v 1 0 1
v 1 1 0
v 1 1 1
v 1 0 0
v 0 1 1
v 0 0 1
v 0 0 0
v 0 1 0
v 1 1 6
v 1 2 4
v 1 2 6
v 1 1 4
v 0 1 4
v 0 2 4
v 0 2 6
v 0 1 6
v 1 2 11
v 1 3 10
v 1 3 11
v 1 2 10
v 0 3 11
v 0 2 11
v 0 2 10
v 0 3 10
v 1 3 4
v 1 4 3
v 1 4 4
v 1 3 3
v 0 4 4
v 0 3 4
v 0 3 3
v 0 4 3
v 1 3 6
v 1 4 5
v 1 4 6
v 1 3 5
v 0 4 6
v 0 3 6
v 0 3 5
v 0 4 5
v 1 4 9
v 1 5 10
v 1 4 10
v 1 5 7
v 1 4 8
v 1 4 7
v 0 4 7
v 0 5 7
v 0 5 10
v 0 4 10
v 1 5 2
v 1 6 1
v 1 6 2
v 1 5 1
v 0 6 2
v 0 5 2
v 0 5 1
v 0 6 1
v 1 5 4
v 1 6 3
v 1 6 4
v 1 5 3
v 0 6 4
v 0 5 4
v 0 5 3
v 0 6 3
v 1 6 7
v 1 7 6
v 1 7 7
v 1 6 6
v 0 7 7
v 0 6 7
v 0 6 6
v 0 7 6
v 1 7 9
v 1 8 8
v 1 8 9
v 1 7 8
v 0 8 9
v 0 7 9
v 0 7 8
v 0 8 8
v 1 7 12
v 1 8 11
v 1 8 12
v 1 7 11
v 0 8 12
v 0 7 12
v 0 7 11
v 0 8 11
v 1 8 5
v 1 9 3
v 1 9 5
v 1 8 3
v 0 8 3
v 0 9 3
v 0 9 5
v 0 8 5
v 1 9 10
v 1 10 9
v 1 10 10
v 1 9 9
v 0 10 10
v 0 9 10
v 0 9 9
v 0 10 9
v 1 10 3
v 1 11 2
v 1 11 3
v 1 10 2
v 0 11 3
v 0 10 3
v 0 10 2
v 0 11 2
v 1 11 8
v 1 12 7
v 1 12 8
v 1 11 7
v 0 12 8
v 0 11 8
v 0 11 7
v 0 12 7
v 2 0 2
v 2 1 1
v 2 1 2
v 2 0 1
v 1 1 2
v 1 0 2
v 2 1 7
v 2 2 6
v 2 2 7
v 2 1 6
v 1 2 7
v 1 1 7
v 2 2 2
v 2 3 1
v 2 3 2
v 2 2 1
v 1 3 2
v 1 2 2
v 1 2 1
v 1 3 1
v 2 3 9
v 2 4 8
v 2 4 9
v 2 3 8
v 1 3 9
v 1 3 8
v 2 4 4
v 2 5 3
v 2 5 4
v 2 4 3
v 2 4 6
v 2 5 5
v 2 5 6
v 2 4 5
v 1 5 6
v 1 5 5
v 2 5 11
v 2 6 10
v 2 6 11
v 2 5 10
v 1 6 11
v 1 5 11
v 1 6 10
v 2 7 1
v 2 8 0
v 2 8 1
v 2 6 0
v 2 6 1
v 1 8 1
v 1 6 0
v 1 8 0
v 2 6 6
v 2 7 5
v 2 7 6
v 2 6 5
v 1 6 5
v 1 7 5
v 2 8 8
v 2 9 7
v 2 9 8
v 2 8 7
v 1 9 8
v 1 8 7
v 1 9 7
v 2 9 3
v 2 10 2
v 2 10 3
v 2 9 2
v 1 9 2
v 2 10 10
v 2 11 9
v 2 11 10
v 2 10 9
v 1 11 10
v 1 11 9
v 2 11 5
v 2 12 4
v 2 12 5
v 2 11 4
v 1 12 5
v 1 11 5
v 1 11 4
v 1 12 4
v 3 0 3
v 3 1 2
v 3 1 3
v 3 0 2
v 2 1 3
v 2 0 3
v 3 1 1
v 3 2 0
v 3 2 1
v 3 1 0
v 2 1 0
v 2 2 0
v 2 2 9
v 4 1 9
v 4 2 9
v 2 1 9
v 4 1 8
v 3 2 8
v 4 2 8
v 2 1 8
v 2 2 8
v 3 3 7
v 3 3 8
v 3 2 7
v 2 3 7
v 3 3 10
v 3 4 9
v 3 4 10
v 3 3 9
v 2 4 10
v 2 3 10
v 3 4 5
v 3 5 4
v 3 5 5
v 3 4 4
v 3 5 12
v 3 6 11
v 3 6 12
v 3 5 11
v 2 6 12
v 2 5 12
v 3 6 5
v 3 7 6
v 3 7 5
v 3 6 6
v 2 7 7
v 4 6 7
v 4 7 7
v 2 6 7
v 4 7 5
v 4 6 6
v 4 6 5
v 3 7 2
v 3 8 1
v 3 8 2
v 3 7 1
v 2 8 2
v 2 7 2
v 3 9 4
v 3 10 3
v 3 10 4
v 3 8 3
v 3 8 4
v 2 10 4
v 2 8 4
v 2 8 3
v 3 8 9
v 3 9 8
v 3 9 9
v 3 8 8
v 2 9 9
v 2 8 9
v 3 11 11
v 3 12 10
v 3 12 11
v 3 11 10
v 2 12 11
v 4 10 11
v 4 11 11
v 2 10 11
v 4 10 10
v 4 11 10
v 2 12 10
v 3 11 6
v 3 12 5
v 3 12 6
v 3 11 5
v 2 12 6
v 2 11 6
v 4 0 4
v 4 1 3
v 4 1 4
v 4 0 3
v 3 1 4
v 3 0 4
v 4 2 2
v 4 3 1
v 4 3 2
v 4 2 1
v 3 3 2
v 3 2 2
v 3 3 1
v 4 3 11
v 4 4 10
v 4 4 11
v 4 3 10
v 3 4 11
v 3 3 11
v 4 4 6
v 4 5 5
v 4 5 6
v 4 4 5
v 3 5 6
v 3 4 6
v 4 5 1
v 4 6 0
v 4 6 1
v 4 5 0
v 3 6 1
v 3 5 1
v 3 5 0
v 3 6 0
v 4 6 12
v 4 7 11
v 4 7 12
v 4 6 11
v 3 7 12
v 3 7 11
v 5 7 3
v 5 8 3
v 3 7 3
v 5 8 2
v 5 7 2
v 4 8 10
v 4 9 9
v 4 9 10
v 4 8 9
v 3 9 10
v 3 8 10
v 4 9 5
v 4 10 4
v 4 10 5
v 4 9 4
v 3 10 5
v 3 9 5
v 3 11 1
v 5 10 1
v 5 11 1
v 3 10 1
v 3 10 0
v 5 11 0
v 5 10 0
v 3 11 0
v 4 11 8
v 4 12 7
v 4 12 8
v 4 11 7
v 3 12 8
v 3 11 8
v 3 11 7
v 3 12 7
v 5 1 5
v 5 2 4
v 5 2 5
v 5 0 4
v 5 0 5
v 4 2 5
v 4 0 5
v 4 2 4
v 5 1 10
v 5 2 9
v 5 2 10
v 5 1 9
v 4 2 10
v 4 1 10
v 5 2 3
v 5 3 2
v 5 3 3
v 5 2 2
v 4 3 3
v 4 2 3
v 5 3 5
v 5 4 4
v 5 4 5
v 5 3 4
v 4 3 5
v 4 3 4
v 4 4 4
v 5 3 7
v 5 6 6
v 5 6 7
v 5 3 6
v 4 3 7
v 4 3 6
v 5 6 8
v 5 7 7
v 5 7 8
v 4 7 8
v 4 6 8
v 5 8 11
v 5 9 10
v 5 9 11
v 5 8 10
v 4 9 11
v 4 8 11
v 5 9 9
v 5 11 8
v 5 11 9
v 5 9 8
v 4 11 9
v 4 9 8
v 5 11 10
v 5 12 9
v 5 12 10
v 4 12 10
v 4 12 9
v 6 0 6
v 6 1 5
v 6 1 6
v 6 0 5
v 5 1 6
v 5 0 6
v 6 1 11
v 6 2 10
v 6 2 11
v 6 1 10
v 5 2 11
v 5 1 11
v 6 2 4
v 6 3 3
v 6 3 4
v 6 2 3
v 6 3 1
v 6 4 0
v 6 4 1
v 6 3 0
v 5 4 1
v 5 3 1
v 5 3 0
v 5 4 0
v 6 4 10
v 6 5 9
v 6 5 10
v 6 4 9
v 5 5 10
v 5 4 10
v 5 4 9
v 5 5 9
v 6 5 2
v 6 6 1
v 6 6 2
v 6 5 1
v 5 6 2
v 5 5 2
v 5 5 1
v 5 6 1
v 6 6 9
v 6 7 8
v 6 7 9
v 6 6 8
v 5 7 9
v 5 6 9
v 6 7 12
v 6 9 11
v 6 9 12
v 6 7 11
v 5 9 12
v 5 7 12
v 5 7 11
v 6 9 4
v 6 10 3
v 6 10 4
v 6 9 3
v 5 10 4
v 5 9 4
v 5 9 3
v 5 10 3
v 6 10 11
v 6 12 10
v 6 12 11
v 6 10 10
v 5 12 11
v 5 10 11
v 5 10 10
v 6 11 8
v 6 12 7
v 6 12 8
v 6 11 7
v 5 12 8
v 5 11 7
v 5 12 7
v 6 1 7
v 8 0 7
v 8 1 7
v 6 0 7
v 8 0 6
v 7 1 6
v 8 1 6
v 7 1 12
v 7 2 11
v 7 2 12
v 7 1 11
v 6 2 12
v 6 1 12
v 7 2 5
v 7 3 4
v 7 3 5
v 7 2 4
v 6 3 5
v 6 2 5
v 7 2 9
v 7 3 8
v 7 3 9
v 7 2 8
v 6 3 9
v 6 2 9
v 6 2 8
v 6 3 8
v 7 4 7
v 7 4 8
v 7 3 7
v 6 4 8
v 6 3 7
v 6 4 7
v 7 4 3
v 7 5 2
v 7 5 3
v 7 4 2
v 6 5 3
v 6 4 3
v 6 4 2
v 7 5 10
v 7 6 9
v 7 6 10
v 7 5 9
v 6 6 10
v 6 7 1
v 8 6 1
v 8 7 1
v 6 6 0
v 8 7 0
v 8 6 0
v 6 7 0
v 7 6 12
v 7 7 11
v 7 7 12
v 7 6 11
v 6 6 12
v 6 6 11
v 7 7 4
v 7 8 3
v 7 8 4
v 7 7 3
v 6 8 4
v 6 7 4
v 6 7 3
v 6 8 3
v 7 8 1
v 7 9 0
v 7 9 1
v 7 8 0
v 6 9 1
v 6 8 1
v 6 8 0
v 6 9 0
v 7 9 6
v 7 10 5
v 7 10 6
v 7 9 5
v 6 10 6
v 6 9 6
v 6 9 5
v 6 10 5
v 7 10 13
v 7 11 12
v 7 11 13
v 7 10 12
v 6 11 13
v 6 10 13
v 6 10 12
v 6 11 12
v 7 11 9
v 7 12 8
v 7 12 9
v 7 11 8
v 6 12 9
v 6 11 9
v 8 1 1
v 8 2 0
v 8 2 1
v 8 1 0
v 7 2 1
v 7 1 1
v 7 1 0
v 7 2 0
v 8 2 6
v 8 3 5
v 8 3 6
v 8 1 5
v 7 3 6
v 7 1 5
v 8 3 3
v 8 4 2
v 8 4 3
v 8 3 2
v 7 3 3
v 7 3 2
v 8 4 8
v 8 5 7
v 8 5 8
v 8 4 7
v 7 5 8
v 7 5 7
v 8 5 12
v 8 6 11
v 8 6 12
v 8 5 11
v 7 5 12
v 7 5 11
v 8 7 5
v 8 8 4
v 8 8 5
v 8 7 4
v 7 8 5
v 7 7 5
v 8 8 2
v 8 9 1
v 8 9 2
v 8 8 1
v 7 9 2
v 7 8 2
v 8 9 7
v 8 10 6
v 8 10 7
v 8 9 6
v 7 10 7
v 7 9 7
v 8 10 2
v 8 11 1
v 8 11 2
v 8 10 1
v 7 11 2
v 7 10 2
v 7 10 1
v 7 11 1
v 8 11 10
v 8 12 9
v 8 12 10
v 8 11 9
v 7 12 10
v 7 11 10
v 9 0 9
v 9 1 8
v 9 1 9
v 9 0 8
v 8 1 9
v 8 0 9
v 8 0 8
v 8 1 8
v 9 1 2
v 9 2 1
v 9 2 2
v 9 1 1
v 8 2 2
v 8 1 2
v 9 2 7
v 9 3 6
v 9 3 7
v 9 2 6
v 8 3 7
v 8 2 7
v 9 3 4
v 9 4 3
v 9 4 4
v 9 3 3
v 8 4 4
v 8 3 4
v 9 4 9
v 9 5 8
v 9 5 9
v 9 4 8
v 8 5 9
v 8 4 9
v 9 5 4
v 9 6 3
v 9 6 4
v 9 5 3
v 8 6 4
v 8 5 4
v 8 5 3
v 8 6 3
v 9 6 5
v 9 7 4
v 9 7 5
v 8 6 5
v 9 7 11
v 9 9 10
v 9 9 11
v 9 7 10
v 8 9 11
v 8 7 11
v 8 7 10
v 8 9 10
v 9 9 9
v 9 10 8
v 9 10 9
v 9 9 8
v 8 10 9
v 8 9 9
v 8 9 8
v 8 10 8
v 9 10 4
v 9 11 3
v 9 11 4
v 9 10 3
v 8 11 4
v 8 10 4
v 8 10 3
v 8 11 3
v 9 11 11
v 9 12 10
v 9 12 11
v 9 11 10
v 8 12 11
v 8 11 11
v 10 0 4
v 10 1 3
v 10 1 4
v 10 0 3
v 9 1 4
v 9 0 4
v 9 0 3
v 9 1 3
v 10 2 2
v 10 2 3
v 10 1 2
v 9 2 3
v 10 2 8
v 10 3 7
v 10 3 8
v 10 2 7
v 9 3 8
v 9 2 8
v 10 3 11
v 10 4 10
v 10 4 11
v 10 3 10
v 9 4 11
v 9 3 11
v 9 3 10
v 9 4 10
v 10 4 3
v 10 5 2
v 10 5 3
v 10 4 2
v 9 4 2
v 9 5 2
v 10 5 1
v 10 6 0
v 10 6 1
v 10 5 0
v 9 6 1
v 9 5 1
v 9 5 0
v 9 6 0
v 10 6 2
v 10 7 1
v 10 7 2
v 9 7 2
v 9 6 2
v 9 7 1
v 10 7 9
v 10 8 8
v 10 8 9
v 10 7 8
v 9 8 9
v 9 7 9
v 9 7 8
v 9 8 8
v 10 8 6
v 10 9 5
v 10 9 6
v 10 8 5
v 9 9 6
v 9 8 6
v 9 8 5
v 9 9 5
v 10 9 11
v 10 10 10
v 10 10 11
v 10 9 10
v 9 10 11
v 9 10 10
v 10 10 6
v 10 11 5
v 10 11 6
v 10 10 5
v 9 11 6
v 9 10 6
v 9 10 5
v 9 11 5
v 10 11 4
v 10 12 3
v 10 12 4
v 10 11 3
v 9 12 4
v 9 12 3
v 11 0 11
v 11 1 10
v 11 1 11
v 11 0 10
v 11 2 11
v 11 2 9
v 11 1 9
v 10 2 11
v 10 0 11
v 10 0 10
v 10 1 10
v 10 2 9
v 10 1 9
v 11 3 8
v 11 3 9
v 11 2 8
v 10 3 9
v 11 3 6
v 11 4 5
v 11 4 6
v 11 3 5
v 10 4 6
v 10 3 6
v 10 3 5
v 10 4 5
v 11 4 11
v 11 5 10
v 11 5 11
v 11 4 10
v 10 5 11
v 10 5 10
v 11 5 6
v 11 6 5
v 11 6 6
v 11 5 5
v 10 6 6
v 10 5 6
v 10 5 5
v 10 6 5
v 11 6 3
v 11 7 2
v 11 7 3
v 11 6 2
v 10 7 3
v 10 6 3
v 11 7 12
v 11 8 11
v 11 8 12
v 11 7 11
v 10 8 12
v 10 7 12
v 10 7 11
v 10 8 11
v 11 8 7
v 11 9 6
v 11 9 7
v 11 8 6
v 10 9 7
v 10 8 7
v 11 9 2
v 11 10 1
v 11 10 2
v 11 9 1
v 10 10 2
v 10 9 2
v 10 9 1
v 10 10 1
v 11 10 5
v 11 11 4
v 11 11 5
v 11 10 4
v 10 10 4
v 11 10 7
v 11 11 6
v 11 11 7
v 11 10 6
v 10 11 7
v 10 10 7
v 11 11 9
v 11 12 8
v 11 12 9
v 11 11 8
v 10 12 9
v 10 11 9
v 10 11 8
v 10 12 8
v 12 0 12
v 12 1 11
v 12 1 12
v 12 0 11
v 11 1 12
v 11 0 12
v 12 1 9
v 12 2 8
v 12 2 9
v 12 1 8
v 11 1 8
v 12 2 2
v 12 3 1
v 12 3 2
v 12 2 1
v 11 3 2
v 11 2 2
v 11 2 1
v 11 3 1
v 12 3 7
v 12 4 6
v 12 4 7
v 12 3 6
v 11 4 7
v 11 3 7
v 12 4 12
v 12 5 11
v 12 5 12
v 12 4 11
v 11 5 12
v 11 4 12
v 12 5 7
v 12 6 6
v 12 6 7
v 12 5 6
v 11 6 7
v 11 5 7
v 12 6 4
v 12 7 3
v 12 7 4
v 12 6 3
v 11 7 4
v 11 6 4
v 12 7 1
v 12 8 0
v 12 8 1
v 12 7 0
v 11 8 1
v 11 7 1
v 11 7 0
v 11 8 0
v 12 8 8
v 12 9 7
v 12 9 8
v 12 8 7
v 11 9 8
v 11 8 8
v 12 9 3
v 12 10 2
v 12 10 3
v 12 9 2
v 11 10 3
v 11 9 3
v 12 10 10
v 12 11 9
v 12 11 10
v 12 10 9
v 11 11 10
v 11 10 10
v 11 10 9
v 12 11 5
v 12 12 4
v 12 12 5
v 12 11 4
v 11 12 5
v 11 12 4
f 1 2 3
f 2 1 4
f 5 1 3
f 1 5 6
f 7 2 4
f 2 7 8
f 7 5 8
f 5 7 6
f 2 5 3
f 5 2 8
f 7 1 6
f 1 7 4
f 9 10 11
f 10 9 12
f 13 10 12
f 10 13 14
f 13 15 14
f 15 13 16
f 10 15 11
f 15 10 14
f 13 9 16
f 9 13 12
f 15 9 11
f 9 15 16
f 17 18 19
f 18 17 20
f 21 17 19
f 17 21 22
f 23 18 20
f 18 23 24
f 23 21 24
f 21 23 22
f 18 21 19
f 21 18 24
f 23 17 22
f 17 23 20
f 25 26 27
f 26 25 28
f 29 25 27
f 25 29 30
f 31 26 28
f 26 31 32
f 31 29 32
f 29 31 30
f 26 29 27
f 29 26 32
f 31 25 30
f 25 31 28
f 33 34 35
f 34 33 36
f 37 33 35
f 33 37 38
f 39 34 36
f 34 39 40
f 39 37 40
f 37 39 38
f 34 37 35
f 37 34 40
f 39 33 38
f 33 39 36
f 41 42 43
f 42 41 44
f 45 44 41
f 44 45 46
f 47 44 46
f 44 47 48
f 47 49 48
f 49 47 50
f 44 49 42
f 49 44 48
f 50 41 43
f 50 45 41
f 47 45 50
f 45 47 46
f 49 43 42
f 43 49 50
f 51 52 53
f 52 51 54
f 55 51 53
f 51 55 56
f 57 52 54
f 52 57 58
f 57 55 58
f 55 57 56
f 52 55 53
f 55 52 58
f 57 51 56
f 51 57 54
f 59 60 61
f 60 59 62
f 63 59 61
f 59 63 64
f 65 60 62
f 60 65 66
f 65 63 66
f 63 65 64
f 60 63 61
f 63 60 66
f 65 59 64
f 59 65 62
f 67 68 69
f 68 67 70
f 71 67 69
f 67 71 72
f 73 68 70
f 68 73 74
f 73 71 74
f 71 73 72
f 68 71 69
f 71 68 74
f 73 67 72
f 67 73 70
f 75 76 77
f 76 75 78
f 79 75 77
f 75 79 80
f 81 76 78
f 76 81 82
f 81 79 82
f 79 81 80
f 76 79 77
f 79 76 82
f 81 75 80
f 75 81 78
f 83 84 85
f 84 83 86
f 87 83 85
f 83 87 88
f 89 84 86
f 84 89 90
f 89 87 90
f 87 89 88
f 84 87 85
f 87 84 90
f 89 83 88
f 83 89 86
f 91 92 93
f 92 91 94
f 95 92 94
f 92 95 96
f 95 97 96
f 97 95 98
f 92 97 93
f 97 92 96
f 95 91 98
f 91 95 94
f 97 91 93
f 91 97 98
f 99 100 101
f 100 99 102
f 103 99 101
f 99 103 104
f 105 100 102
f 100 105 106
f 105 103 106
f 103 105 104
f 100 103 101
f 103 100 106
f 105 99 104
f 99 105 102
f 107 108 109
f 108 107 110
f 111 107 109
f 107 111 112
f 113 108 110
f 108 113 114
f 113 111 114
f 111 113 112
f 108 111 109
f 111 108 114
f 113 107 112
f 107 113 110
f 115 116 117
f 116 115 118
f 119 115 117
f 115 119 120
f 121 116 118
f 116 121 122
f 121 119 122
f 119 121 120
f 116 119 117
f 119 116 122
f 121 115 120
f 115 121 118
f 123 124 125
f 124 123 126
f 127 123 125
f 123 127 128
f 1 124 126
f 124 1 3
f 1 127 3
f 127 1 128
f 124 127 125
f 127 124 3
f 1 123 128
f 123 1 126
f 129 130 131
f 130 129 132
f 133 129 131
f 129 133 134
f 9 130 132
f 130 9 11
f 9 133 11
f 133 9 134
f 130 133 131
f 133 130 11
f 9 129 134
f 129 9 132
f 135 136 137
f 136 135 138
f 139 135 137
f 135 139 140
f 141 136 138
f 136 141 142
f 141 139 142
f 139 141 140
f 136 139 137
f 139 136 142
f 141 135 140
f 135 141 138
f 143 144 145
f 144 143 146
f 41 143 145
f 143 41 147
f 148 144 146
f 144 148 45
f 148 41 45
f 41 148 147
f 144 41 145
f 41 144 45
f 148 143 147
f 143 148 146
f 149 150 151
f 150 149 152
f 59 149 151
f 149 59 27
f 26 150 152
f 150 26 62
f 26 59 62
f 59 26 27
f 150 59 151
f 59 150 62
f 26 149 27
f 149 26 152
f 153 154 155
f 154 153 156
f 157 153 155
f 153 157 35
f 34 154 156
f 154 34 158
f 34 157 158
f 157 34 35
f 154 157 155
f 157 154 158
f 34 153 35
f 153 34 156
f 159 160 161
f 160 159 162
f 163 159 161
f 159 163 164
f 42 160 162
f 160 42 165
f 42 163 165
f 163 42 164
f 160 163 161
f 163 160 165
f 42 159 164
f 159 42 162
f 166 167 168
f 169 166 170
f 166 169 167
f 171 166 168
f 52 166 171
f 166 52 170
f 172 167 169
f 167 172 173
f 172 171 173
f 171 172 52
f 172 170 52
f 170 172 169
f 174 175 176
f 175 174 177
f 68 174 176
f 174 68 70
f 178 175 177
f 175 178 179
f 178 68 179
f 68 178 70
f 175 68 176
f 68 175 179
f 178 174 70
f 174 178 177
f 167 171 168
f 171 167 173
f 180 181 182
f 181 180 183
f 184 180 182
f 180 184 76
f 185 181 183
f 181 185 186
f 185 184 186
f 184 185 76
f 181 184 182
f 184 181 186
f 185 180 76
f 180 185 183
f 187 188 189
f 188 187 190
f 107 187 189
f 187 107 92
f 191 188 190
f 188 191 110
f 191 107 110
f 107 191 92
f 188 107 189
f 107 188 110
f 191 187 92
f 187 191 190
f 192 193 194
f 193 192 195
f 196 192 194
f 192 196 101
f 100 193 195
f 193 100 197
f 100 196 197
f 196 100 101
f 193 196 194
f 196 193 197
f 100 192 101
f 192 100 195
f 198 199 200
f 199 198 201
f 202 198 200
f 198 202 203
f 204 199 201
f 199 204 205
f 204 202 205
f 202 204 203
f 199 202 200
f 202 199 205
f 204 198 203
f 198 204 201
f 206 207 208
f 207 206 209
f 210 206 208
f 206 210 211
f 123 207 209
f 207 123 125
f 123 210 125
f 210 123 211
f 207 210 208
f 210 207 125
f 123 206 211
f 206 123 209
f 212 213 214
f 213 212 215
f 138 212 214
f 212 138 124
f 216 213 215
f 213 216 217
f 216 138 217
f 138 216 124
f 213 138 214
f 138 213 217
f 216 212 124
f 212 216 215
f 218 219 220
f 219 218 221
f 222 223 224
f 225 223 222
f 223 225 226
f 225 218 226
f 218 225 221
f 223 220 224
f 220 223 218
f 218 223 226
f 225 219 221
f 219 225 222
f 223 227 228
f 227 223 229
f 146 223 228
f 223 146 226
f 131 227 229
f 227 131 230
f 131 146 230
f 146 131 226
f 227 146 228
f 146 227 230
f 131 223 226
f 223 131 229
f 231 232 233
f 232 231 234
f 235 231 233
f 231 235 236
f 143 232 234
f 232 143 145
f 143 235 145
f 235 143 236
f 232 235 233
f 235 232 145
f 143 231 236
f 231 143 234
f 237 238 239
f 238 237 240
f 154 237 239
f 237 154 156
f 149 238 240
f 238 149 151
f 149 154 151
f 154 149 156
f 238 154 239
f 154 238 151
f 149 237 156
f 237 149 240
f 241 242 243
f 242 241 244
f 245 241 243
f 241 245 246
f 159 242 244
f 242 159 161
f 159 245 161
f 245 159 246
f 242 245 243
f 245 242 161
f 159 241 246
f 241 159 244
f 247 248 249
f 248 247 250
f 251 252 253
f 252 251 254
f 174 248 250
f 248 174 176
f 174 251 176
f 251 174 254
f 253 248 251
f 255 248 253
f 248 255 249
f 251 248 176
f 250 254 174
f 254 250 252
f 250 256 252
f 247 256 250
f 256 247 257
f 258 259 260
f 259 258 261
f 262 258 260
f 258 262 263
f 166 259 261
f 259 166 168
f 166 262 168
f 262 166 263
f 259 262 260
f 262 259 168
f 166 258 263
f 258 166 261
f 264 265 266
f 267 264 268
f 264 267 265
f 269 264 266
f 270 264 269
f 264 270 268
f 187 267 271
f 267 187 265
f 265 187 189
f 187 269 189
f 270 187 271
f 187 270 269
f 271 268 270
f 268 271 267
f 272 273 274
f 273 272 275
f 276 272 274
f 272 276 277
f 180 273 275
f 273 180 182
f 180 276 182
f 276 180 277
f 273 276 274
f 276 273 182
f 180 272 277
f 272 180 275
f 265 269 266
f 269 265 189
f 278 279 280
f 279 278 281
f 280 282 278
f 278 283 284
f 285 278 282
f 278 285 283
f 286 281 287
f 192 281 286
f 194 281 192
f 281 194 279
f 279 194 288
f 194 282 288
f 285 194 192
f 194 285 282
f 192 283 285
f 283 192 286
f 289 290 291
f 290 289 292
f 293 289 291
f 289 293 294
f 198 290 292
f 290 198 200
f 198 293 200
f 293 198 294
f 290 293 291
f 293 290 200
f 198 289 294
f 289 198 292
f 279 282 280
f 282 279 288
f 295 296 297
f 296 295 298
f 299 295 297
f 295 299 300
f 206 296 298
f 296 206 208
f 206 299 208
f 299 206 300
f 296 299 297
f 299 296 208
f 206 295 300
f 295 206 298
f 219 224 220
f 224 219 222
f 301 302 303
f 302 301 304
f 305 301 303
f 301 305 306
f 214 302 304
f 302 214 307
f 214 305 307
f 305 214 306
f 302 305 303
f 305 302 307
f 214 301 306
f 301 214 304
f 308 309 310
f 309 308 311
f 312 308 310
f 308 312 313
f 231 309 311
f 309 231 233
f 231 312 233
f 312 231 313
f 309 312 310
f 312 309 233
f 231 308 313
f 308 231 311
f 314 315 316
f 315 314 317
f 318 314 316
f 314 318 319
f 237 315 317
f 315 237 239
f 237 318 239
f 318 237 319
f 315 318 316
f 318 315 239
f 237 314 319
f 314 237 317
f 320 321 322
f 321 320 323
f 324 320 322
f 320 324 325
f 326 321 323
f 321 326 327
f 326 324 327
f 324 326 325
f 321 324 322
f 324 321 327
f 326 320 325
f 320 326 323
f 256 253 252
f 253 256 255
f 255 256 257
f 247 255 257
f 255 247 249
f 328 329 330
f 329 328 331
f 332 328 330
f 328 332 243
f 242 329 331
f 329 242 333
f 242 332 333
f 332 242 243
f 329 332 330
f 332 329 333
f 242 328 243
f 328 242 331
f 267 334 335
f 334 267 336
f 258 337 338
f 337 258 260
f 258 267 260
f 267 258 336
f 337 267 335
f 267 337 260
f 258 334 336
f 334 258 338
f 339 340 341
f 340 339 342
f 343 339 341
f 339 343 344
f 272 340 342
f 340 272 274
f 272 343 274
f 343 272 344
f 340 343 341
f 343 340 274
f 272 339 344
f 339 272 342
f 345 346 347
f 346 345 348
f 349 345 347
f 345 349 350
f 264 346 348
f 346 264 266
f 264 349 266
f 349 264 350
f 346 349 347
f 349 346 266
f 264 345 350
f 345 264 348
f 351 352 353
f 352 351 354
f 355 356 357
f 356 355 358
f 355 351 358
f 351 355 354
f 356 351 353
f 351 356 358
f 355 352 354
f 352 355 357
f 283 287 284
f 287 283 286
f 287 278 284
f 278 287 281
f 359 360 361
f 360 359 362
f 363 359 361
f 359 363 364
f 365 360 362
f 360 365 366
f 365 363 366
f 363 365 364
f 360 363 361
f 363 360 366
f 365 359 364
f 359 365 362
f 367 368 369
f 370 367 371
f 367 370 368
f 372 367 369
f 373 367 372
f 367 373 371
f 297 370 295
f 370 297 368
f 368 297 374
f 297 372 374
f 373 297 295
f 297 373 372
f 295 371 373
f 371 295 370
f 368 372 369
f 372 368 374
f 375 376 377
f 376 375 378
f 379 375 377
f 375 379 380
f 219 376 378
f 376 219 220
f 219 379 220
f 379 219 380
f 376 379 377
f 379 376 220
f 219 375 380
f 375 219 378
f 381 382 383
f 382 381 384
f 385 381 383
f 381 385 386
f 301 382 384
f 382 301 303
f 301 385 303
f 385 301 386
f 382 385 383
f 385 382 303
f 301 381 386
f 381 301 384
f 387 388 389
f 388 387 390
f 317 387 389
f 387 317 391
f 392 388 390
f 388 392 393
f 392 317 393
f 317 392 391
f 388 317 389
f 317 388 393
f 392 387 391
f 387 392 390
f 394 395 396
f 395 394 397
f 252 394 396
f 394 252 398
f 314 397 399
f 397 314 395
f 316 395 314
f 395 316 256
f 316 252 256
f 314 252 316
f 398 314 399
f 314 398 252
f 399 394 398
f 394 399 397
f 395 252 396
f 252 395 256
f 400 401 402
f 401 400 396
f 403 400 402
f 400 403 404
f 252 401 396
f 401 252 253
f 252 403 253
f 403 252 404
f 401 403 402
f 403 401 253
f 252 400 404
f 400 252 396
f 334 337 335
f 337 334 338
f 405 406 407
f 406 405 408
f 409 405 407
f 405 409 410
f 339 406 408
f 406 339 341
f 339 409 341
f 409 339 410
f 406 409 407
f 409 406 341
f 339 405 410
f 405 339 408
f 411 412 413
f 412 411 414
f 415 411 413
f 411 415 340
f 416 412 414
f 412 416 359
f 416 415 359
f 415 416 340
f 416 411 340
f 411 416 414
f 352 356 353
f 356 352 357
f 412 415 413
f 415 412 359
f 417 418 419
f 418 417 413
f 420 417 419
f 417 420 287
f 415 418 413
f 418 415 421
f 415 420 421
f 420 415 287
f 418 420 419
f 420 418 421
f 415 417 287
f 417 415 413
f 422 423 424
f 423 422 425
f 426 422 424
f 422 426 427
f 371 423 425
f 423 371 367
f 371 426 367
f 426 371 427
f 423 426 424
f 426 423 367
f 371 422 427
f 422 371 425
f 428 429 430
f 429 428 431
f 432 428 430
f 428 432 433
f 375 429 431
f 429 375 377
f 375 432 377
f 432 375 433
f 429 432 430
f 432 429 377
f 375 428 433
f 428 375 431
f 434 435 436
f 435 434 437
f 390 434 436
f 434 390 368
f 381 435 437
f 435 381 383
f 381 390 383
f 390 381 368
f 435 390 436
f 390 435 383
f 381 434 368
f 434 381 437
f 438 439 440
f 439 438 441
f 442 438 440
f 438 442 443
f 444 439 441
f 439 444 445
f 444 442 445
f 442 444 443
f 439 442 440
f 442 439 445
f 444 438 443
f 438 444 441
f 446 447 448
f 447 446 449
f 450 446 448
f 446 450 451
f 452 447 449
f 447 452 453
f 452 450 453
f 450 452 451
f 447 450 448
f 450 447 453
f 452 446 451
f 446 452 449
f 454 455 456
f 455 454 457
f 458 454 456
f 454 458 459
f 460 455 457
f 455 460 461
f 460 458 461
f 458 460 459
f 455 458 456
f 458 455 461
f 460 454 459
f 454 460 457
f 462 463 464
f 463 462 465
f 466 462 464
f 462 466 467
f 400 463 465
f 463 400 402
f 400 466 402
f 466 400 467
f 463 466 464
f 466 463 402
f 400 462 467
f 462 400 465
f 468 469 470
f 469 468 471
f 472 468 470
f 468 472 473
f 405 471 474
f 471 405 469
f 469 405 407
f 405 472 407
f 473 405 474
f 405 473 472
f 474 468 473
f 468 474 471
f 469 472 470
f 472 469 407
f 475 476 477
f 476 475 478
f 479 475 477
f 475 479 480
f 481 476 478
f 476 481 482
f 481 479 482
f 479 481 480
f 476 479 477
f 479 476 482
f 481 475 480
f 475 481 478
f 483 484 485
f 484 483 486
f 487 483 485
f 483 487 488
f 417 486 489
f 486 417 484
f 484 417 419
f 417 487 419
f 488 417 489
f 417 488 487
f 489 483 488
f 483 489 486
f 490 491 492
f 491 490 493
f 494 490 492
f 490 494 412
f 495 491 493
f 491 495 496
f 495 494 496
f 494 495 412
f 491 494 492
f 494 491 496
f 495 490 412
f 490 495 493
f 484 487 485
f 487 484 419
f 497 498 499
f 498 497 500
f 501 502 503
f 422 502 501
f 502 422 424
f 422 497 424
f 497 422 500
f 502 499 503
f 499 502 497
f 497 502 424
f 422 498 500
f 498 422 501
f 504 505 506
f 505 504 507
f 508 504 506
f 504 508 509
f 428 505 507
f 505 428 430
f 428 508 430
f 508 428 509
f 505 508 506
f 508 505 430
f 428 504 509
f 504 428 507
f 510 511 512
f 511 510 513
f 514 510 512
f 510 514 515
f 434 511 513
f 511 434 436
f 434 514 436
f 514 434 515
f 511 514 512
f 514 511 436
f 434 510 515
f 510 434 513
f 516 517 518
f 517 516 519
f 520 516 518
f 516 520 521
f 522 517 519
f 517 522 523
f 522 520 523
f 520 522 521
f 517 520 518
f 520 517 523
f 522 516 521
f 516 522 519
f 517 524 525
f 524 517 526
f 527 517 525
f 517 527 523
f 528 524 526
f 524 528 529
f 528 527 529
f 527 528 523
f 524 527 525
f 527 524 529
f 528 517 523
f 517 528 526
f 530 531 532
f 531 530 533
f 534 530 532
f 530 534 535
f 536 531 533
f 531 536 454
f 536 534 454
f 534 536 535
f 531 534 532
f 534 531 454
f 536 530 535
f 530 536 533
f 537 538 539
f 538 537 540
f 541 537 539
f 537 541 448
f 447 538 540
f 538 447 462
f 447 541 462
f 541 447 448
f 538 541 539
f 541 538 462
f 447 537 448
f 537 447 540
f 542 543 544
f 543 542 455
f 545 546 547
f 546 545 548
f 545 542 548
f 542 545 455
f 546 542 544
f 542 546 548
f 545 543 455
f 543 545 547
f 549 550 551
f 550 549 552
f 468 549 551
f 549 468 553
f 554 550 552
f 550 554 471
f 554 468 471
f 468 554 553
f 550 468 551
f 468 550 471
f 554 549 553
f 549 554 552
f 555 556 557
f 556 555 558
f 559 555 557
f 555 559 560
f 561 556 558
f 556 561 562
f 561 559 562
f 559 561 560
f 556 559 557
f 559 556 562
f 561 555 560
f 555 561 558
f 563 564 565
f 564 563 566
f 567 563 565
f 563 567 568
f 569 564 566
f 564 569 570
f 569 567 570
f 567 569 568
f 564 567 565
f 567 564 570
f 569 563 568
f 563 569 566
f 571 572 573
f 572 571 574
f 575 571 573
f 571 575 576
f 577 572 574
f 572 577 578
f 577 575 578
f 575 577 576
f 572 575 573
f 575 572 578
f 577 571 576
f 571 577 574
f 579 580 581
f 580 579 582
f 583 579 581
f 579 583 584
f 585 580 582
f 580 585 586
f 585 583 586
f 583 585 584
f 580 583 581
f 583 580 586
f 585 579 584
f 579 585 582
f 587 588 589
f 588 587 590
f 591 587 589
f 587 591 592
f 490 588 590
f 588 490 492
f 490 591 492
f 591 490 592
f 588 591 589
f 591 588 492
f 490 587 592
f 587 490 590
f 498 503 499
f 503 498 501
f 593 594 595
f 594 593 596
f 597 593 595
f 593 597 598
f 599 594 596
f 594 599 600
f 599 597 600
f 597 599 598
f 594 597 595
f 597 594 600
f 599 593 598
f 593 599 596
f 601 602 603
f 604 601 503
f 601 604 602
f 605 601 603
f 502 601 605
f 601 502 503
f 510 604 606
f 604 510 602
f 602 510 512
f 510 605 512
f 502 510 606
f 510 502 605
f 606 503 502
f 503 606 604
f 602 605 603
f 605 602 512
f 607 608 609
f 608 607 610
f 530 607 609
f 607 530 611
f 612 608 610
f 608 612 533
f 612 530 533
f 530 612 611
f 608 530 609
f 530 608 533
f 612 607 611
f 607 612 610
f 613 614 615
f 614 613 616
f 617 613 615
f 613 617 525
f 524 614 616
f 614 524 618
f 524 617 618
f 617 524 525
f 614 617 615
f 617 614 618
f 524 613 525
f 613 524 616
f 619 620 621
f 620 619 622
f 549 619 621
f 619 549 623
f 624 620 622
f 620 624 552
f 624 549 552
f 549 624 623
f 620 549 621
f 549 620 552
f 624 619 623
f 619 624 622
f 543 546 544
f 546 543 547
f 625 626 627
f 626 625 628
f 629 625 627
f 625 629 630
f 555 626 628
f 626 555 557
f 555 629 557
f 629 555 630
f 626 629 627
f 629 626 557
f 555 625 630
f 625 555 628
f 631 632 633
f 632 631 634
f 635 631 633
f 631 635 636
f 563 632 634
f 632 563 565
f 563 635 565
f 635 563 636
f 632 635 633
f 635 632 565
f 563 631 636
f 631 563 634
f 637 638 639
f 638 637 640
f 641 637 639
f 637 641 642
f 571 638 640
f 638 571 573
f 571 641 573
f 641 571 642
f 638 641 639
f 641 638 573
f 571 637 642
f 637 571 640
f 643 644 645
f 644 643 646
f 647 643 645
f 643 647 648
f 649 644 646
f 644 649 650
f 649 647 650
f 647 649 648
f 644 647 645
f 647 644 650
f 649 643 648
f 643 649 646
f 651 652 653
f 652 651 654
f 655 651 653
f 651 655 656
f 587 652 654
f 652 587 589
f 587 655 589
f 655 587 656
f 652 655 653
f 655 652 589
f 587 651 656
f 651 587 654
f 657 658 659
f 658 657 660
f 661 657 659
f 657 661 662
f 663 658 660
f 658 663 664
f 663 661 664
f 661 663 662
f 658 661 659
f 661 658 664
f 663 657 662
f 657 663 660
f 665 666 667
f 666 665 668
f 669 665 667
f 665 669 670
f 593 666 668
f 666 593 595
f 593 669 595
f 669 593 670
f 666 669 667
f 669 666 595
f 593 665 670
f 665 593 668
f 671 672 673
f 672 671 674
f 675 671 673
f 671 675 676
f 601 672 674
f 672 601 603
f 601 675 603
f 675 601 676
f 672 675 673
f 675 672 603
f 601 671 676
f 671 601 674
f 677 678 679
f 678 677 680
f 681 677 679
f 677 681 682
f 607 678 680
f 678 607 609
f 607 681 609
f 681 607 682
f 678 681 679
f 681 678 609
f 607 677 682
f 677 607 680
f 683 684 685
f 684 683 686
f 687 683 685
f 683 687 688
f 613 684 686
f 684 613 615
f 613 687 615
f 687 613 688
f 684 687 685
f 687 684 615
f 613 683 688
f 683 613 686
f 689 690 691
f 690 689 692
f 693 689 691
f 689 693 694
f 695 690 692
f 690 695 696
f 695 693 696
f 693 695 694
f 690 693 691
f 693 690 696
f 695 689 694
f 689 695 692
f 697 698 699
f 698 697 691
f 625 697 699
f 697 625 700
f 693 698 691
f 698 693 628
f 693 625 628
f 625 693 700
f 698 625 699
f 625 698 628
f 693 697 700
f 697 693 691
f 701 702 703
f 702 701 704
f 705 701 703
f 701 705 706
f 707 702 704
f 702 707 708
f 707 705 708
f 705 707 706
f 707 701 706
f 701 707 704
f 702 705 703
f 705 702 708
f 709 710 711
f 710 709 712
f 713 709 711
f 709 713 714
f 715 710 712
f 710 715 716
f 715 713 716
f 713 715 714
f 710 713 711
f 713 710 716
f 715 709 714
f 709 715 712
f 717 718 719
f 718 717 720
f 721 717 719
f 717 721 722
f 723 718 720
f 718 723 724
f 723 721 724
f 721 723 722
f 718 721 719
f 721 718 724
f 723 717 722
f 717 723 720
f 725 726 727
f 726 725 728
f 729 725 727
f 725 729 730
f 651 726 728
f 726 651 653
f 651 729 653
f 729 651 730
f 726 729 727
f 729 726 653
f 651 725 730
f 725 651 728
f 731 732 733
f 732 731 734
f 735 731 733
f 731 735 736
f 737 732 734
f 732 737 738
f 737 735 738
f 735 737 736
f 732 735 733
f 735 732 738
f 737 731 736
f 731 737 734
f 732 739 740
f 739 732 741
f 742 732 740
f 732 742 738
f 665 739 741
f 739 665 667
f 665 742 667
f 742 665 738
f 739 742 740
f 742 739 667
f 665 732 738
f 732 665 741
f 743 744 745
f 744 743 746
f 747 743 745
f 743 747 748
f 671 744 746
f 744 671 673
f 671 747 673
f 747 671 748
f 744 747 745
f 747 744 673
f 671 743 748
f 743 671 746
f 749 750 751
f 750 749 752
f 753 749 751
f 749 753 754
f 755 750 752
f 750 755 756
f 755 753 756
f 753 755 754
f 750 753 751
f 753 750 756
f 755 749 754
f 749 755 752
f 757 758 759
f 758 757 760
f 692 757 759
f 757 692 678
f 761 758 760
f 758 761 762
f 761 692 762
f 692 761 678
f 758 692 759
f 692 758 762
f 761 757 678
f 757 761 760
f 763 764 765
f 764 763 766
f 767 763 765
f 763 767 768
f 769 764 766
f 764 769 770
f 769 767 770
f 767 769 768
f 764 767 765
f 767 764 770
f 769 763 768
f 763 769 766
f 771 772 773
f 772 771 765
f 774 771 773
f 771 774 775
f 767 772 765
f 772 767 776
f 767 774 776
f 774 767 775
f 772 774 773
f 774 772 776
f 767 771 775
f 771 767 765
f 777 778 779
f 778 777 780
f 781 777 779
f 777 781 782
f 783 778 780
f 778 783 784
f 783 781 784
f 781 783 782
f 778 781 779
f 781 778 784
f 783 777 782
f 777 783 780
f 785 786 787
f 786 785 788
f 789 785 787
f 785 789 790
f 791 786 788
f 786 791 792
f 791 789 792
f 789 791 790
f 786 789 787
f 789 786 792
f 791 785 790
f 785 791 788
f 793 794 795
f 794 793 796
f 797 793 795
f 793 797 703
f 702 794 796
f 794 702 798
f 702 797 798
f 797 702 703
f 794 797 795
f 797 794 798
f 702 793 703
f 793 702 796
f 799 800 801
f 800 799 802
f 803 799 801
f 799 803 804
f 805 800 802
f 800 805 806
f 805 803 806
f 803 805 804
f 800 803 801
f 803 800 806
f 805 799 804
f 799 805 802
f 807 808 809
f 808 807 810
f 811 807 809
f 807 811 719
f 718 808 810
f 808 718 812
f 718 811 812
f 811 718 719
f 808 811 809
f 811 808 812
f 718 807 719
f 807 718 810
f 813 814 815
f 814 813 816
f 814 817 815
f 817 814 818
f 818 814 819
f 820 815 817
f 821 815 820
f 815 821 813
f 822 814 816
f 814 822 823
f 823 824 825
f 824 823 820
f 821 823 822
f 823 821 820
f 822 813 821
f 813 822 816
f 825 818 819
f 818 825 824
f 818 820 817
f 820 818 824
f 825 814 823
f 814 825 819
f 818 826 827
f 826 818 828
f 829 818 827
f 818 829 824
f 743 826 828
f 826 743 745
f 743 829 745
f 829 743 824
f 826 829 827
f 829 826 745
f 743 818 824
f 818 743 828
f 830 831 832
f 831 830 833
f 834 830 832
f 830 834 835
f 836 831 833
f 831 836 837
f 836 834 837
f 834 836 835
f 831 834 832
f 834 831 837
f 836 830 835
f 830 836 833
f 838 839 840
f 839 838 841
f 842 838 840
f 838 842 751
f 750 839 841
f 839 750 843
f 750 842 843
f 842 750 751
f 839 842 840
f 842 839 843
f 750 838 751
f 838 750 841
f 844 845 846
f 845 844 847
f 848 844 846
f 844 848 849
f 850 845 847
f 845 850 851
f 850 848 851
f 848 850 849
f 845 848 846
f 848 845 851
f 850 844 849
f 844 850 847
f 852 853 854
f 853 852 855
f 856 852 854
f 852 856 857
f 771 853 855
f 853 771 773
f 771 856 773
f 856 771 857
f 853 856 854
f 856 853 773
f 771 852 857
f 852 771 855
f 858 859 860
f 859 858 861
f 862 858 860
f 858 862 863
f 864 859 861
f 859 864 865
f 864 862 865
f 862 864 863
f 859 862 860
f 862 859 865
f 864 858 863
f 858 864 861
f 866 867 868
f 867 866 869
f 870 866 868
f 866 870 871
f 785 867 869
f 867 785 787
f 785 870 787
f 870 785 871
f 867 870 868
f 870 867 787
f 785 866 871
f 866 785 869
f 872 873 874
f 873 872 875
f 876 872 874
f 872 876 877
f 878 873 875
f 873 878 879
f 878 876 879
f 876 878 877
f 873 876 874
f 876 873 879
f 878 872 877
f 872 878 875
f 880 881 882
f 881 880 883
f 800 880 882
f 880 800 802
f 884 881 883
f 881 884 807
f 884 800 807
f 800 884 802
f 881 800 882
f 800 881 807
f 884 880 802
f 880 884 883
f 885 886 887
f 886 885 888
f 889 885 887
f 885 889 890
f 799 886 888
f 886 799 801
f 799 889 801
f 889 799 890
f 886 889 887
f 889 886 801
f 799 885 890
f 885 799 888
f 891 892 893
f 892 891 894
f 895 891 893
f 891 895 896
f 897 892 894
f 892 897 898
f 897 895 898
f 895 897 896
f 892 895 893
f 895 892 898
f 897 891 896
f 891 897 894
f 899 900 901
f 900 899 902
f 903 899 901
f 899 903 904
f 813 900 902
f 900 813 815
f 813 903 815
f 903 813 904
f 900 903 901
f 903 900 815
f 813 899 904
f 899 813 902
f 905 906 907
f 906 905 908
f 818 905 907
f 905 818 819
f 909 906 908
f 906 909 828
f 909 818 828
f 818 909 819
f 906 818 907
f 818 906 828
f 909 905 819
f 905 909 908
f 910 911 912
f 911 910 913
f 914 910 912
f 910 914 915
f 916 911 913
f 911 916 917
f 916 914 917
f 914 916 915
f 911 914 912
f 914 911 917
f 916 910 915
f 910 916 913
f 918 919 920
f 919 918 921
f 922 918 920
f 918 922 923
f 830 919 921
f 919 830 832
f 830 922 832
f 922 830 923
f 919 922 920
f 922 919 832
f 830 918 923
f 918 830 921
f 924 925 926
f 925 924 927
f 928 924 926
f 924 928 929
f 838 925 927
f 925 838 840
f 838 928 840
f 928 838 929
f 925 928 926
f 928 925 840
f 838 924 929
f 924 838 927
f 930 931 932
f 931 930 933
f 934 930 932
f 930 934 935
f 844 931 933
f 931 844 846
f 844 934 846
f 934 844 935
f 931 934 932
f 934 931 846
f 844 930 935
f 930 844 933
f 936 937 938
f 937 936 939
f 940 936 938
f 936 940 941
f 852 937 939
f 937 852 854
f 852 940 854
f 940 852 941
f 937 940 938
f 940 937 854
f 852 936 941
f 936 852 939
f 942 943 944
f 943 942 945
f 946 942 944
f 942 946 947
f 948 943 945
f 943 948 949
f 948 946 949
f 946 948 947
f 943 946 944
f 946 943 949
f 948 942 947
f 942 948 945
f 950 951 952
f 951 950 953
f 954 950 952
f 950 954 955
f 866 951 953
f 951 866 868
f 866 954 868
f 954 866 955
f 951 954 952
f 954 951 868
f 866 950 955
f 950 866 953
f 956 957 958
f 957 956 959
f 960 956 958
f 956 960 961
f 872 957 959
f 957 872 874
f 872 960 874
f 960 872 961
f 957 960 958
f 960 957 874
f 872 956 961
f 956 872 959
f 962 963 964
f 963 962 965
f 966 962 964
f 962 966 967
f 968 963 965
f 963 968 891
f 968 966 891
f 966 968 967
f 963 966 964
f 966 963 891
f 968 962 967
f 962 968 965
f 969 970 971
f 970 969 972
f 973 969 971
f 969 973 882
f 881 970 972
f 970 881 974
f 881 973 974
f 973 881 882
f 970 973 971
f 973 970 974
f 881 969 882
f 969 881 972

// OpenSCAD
union() {
    translate([0, 0, 0]) cube([1, 1, 1]);
    translate([0, 1, 4]) cube([1, 1, 1]);
    translate([0, 1, 5]) cube([1, 1, 1]);
    translate([0, 2, 10]) cube([1, 1, 1]);
    translate([0, 3, 3]) cube([1, 1, 1]);
    translate([0, 3, 5]) cube([1, 1, 1]);
    translate([0, 4, 7]) cube([1, 1, 1]);
    translate([0, 4, 8]) cube([1, 1, 1]);
    translate([0, 4, 9]) cube([1, 1, 1]);
    translate([0, 5, 1]) cube([1, 1, 1]);
    translate([0, 5, 3]) cube([1, 1, 1]);
    translate([0, 6, 6]) cube([1, 1, 1]);
    translate([0, 7, 8]) cube([1, 1, 1]);
    translate([0, 7, 11]) cube([1, 1, 1]);
    translate([0, 8, 3]) cube([1, 1, 1]);
    translate([0, 8, 4]) cube([1, 1, 1]);
    translate([0, 9, 9]) cube([1, 1, 1]);
    translate([0, 10, 2]) cube([1, 1, 1]);
    translate([0, 11, 7]) cube([1, 1, 1]);
    translate([1, 0, 1]) cube([1, 1, 1]);
    translate([1, 1, 6]) cube([1, 1, 1]);
    translate([1, 2, 1]) cube([1, 1, 1]);
    translate([1, 3, 8]) cube([1, 1, 1]);
    translate([1, 4, 3]) cube([1, 1, 1]);
    translate([1, 4, 5]) cube([1, 1, 1]);
    translate([1, 5, 10]) cube([1, 1, 1]);
    translate([1, 6, 0]) cube([1, 1, 1]);
    translate([1, 6, 5]) cube([1, 1, 1]);
    translate([1, 7, 0]) cube([1, 1, 1]);
    translate([1, 8, 7]) cube([1, 1, 1]);
    translate([1, 9, 2]) cube([1, 1, 1]);
    translate([1, 10, 9]) cube([1, 1, 1]);
    translate([1, 11, 4]) cube([1, 1, 1]);
    translate([2, 0, 2]) cube([1, 1, 1]);
    translate([2, 1, 0]) cube([1, 1, 1]);
    translate([2, 1, 8]) cube([1, 1, 1]);
    translate([2, 2, 7]) cube([1, 1, 1]);
    translate([2, 3, 9]) cube([1, 1, 1]);
    translate([2, 4, 4]) cube([1, 1, 1]);
    translate([2, 5, 11]) cube([1, 1, 1]);
    translate([2, 6, 6]) cube([1, 1, 1]);
    translate([2, 7, 1]) cube([1, 1, 1]);
    translate([2, 8, 3]) cube([1, 1, 1]);
    translate([2, 8, 8]) cube([1, 1, 1]);
    translate([2, 9, 3]) cube([1, 1, 1]);
    translate([2, 10, 10]) cube([1, 1, 1]);
    translate([2, 11, 5]) cube([1, 1, 1]);
    translate([2, 11, 10]) cube([1, 1, 1]);
    translate([3, 0, 3]) cube([1, 1, 1]);
    translate([3, 1, 8]) cube([1, 1, 1]);
    translate([3, 2, 1]) cube([1, 1, 1]);
    translate([3, 3, 10]) cube([1, 1, 1]);
    translate([3, 4, 5]) cube([1, 1, 1]);
    translate([3, 5, 0]) cube([1, 1, 1]);
    translate([3, 6, 5]) cube([1, 1, 1]);
    translate([3, 6, 6]) cube([1, 1, 1]);
    translate([3, 6, 11]) cube([1, 1, 1]);
    translate([3, 7, 2]) cube([1, 1, 1]);
    translate([3, 8, 9]) cube([1, 1, 1]);
    translate([3, 9, 4]) cube([1, 1, 1]);
    translate([3, 10, 0]) cube([1, 1, 1]);
    translate([3, 10, 10]) cube([1, 1, 1]);
    translate([3, 11, 7]) cube([1, 1, 1]);
    translate([4, 0, 4]) cube([1, 1, 1]);
    translate([4, 1, 4]) cube([1, 1, 1]);
    translate([4, 1, 9]) cube([1, 1, 1]);
    translate([4, 2, 2]) cube([1, 1, 1]);
    translate([4, 3, 4]) cube([1, 1, 1]);
    translate([4, 3, 6]) cube([1, 1, 1]);
    translate([4, 4, 6]) cube([1, 1, 1]);
    translate([4, 5, 6]) cube([1, 1, 1]);
    translate([4, 6, 7]) cube([1, 1, 1]);
    translate([4, 7, 2]) cube([1, 1, 1]);
    translate([4, 8, 10]) cube([1, 1, 1]);
    translate([4, 9, 8]) cube([1, 1, 1]);
    translate([4, 10, 0]) cube([1, 1, 1]);
    translate([4, 10, 8]) cube([1, 1, 1]);
    translate([4, 11, 9]) cube([1, 1, 1]);
    translate([5, 0, 5]) cube([1, 1, 1]);
    translate([5, 1, 10]) cube([1, 1, 1]);
    translate([5, 2, 3]) cube([1, 1, 1]);
    translate([5, 3, 0]) cube([1, 1, 1]);
    translate([5, 4, 9]) cube([1, 1, 1]);
    translate([5, 5, 1]) cube([1, 1, 1]);
    translate([5, 6, 8]) cube([1, 1, 1]);
    translate([5, 7, 11]) cube([1, 1, 1]);
    translate([5, 8, 11]) cube([1, 1, 1]);
    translate([5, 9, 3]) cube([1, 1, 1]);
    translate([5, 10, 10]) cube([1, 1, 1]);
    translate([5, 11, 7]) cube([1, 1, 1]);
    translate([5, 11, 10]) cube([1, 1, 1]);
    translate([6, 0, 6]) cube([1, 1, 1]);
    translate([6, 1, 11]) cube([1, 1, 1]);
    translate([6, 2, 4]) cube([1, 1, 1]);
    translate([6, 2, 8]) cube([1, 1, 1]);
    translate([6, 3, 7]) cube([1, 1, 1]);
    translate([6, 4, 2]) cube([1, 1, 1]);
    translate([6, 5, 9]) cube([1, 1, 1]);
    translate([6, 6, 0]) cube([1, 1, 1]);
    translate([6, 6, 11]) cube([1, 1, 1]);
    translate([6, 7, 3]) cube([1, 1, 1]);
    translate([6, 8, 0]) cube([1, 1, 1]);
    translate([6, 9, 5]) cube([1, 1, 1]);
    translate([6, 10, 12.0]) cube([1, 1, 1]);
    translate([6, 11, 8]) cube([1, 1, 1]);
    translate([7, 0, 6]) cube([1, 1, 1]);
    translate([7, 1, 0]) cube([1, 1, 1]);
    translate([7, 1, 5]) cube([1, 1, 1]);
    translate([7, 2, 5]) cube([1, 1, 1]);
    translate([7, 3, 2]) cube([1, 1, 1]);
    translate([7, 4, 7]) cube([1, 1, 1]);
    translate([7, 5, 11]) cube([1, 1, 1]);
    translate([7, 6, 0]) cube([1, 1, 1]);
    translate([7, 7, 4]) cube([1, 1, 1]);
    translate([7, 8, 1]) cube([1, 1, 1]);
    translate([7, 9, 6]) cube([1, 1, 1]);
    translate([7, 10, 1]) cube([1, 1, 1]);
    translate([7, 11, 9]) cube([1, 1, 1]);
    translate([8, 0, 8]) cube([1, 1, 1]);
    translate([8, 1, 1]) cube([1, 1, 1]);
    translate([8, 2, 6]) cube([1, 1, 1]);
    translate([8, 3, 3]) cube([1, 1, 1]);
    translate([8, 4, 8]) cube([1, 1, 1]);
    translate([8, 5, 3]) cube([1, 1, 1]);
    translate([8, 6, 4]) cube([1, 1, 1]);
    translate([8, 7, 10]) cube([1, 1, 1]);
    translate([8, 8, 10]) cube([1, 1, 1]);
    translate([8, 9, 8]) cube([1, 1, 1]);
    translate([8, 10, 3]) cube([1, 1, 1]);
    translate([8, 11, 10]) cube([1, 1, 1]);
    translate([9, 0, 3]) cube([1, 1, 1]);
    translate([9, 1, 2]) cube([1, 1, 1]);
    translate([9, 2, 7]) cube([1, 1, 1]);
    translate([9, 3, 10]) cube([1, 1, 1]);
    translate([9, 4, 2]) cube([1, 1, 1]);
    translate([9, 5, 0]) cube([1, 1, 1]);
    translate([9, 6, 1]) cube([1, 1, 1]);
    translate([9, 7, 8]) cube([1, 1, 1]);
    translate([9, 8, 5]) cube([1, 1, 1]);
    translate([9, 9, 10]) cube([1, 1, 1]);
    translate([9, 10, 5]) cube([1, 1, 1]);
    translate([9, 11, 3]) cube([1, 1, 1]);
    translate([10, 0, 10]) cube([1, 1, 1]);
    translate([10, 1, 9]) cube([1, 1, 1]);
    translate([10, 1, 10]) cube([1, 1, 1]);
    translate([10, 2, 8]) cube([1, 1, 1]);
    translate([10, 3, 5]) cube([1, 1, 1]);
    translate([10, 4, 10]) cube([1, 1, 1]);
    translate([10, 5, 5]) cube([1, 1, 1]);
    translate([10, 6, 2]) cube([1, 1, 1]);
    translate([10, 7, 11]) cube([1, 1, 1]);
    translate([10, 8, 6]) cube([1, 1, 1]);
    translate([10, 9, 1]) cube([1, 1, 1]);
    translate([10, 10, 4]) cube([1, 1, 1]);
    translate([10, 10, 6]) cube([1, 1, 1]);
    translate([10, 11, 8]) cube([1, 1, 1]);
    translate([11, 0, 11]) cube([1, 1, 1]);
    translate([11, 1, 8]) cube([1, 1, 1]);
    translate([11, 2, 1]) cube([1, 1, 1]);
    translate([11, 3, 6]) cube([1, 1, 1]);
    translate([11, 4, 11]) cube([1, 1, 1]);
    translate([11, 5, 6]) cube([1, 1, 1]);
    translate([11, 6, 3]) cube([1, 1, 1]);
    translate([11, 7, 0]) cube([1, 1, 1]);
    translate([11, 8, 7]) cube([1, 1, 1]);
    translate([11, 9, 2]) cube([1, 1, 1]);
    translate([11, 10, 9]) cube([1, 1, 1]);
    translate([11, 11, 4]) cube([1, 1, 1]);
}
